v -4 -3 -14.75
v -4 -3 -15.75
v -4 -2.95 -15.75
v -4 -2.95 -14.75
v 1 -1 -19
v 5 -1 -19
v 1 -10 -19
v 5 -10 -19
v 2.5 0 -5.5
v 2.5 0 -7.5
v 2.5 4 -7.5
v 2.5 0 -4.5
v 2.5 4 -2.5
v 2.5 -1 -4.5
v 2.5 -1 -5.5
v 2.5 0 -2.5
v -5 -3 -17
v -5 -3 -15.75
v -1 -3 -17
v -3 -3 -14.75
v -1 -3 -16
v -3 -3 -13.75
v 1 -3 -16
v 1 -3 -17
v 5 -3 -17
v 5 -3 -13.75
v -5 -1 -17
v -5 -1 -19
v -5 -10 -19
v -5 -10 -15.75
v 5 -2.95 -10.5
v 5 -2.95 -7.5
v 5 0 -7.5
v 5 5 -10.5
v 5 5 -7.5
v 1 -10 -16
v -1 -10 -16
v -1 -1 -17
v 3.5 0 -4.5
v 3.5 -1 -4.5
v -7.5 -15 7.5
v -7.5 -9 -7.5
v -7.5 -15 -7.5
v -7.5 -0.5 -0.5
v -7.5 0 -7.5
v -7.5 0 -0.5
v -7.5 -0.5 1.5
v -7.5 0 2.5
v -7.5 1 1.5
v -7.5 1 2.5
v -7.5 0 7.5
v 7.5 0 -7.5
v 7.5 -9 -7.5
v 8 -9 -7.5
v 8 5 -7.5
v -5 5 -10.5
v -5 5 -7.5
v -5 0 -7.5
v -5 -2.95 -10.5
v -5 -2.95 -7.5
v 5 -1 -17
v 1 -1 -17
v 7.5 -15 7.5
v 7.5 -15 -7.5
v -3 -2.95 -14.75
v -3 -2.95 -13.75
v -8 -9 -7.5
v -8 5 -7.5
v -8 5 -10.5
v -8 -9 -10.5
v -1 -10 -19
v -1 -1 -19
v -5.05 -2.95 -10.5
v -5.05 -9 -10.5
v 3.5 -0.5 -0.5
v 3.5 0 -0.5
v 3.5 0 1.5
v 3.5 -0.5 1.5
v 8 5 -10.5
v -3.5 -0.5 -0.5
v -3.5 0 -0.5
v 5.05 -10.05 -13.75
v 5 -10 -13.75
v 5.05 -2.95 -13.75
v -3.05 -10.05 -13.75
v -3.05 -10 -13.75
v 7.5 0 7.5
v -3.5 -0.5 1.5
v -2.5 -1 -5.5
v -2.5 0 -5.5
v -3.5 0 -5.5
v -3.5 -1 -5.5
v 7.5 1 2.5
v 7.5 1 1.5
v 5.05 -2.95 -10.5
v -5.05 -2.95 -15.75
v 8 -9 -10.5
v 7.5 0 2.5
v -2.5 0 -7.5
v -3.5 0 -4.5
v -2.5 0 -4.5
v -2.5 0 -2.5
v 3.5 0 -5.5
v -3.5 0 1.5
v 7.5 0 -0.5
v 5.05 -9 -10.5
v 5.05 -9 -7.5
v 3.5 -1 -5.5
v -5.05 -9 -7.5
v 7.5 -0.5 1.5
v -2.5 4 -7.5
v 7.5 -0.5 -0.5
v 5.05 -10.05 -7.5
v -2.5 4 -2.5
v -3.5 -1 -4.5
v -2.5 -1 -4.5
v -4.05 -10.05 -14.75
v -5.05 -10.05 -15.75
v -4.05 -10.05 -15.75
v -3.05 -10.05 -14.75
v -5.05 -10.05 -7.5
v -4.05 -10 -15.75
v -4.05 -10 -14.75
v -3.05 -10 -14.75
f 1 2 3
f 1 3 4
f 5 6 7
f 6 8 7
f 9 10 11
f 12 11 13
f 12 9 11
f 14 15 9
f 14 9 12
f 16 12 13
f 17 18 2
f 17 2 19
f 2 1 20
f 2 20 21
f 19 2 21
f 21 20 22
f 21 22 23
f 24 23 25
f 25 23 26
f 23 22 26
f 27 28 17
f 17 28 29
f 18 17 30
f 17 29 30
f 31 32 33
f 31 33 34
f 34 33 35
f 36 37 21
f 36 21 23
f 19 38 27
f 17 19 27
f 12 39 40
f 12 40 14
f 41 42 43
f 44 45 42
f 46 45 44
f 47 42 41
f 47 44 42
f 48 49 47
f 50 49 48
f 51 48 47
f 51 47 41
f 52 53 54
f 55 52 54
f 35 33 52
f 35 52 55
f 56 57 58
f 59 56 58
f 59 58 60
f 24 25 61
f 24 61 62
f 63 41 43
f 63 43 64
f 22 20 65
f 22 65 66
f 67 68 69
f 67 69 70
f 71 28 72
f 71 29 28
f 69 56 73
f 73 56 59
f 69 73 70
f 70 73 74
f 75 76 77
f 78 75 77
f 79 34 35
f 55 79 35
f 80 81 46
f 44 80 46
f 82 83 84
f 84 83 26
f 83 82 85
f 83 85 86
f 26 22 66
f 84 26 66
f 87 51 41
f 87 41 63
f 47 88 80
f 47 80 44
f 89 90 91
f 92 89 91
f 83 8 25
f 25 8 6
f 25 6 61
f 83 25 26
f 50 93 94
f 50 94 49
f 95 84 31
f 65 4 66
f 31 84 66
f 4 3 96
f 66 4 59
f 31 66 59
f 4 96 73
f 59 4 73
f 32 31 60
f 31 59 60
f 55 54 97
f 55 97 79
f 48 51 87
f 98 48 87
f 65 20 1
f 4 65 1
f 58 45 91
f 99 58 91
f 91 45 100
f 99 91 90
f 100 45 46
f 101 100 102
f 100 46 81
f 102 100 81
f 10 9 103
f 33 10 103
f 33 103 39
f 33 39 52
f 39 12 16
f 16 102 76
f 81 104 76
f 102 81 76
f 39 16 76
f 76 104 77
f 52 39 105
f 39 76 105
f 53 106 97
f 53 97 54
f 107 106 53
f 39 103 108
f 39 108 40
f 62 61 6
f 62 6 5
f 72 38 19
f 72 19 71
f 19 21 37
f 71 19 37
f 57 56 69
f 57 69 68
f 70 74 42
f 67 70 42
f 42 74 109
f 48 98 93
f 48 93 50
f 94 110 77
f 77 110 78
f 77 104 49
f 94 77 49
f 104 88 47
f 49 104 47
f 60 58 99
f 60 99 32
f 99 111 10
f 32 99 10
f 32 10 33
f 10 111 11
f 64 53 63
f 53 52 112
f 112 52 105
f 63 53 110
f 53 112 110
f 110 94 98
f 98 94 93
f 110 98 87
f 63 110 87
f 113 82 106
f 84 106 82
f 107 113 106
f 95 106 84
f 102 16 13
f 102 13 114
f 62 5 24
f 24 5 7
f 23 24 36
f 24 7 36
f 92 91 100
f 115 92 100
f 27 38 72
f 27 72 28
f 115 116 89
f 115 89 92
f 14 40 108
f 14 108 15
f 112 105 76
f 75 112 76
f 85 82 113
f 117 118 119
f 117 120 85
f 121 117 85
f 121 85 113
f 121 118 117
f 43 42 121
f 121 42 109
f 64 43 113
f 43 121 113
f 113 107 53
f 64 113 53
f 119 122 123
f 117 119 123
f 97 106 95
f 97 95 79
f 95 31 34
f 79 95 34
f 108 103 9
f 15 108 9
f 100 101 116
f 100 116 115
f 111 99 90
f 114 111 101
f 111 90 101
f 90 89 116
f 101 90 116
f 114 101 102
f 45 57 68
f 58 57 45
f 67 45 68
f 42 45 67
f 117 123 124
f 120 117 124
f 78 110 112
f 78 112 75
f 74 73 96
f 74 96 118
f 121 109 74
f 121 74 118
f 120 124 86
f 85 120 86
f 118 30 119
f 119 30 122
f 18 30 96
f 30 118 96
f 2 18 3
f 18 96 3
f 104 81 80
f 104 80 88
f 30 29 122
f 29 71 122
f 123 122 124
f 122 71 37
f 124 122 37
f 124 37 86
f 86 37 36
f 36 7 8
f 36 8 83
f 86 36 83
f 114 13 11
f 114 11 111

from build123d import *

# Parameters (mm, degrees)
F0_W      = 15
F0_H      = 15
F1_DEPTH  = 15
F2_W      = 10
F2_H      = 7
F3_DEPTH  = 8.5
F4_W      = 4
F4_H      = 7
F5_DEPTH  = 3
F6_W      = 4
F6_H      = 7
F7_DEPTH  = 3
F8_W      = 4
F8_H      = 2
F9_DEPTH  = 2
F10_W     = 4
F10_H     = 2
F11_DEPTH = 2
F12_W     = 14
F12_H     = 3
F13_DEPTH = 3
F14_W     = 14
F14_H     = 3
F15_DEPTH = 3
F16_W     = 5
F16_H     = 5
F17_DEPTH = 4
F18_W     = 15
F18_H     = 1
F19_DEPTH = 1
F20_W     = 1
F20_H     = 1
F21_DEPTH = 1
F22_W     = 1
F22_H     = 1
F23_DEPTH = 1
F24_W     = 2
F24_H     = 2
F25_DEPTH = 0.5
F26_W     = 2
F26_H     = 2
F27_DEPTH = 0.5
F28_W     = 2
F28_H     = 2
F29_DEPTH = 0.5
F30_W     = 10
F30_H     = 6.25
F31_DEPTH = 0.05
F32_W     = 2
F32_H     = 1
F33_DEPTH = 0.05
F34_W     = 1
F34_H     = 1
F35_DEPTH = 0.05
F36_W     = 7.05
F36_H     = 8.25
F37_DEPTH = 0.05
F38_W     = 1
F38_H     = 1
F39_DEPTH = 0.05
F40_W     = 7.1
F40_H     = 6.25
F41_DEPTH = 0.05


with BuildPart() as f1:
    # F0 (on Front) → F1 (new body)
    with BuildSketch(Plane.XZ):
        Rectangle(F0_W, F0_H)
    extrude(amount=F1_DEPTH)

    # F2 (on face) → F3 (join)
    with BuildSketch(Plane(origin=(0, 0, -7.5), x_dir=(1, 0, 0), z_dir=(0, 0, -1))):
        with Locations((0, 6.5)):
            Rectangle(F2_W, F2_H)
    extrude(amount=F3_DEPTH)

    # F4 (on face) → F5 (join)
    with BuildSketch(Plane(origin=(0, 0, -16), x_dir=(1, 0, 0), z_dir=(0, 0, -1))):
        with Locations((-3, 6.5)):
            Rectangle(F4_W, F4_H)
    extrude(amount=F5_DEPTH)

    # F6 (on face) → F7 (join)
    with BuildSketch(Plane(origin=(0, 0, -16), x_dir=(1, 0, 0), z_dir=(0, 0, -1))):
        with Locations((3, 6.5)):
            Rectangle(F6_W, F6_H)
    extrude(amount=F7_DEPTH)

    # F8 (on face) → F9 (join)
    with BuildSketch(Plane(origin=(0, -3, 0), x_dir=(-1, 0, 0), z_dir=(0, 1, 0))):
        with Locations((-3, -18)):
            Rectangle(F8_W, F8_H)
    extrude(amount=F9_DEPTH)

    # F10 (on face) → F11 (join, symmetric)
    with BuildSketch(Plane(origin=(0, -3, 0), x_dir=(-1, 0, 0), z_dir=(0, 1, 0))):
        with Locations((3, -18)):
            Rectangle(F10_W, F10_H)
    extrude(amount=F11_DEPTH, both=True)

    # F12 (on face) → F13 (join)
    with BuildSketch(Plane.YZ.offset(5)):
        with Locations((-2, -9)):
            Rectangle(F12_W, F12_H)
    extrude(amount=F13_DEPTH)

    # F14 (on face) → F15 (join)
    with BuildSketch(Plane(origin=(-5, 0, 0), x_dir=(0, -1, 0), z_dir=(-1, 0, 0))):
        with Locations((2, -9)):
            Rectangle(F14_W, F14_H)
    extrude(amount=F15_DEPTH)

    # F16 (on face) → F17 (join)
    with BuildSketch(Plane(origin=(0, 0, 0), x_dir=(-1, 0, 0), z_dir=(0, 1, 0))):
        with Locations((0, -5)):
            Rectangle(F16_W, F16_H)
    extrude(amount=F17_DEPTH)

    # F18 (on face) → F19 (join)
    with BuildSketch(Plane(origin=(0, 0, 0), x_dir=(-1, 0, 0), z_dir=(0, 1, 0))):
        with Locations((0, 2)):
            Rectangle(F18_W, F18_H)
    extrude(amount=F19_DEPTH)

    # F20 (on face) → F21 (cut)
    with BuildSketch(Plane(origin=(0, 0, 0), x_dir=(-1, 0, 0), z_dir=(0, 1, 0))):
        with Locations((3, -5)):
            Rectangle(F20_W, F20_H)
    extrude(amount=-F21_DEPTH, mode=Mode.SUBTRACT)

    # F22 (on face) → F23 (cut)
    with BuildSketch(Plane(origin=(0, 0, 0), x_dir=(-1, 0, 0), z_dir=(0, 1, 0))):
        with Locations((-3, -5)):
            Rectangle(F22_W, F22_H)
    extrude(amount=-F23_DEPTH, mode=Mode.SUBTRACT)

    # F24 (on face) → F25 (cut)
    with BuildSketch(Plane(origin=(0, 0, 0), x_dir=(-1, 0, 0), z_dir=(0, 1, 0))):
        with Locations((-6.5, 0.5)):
            Rectangle(F24_W, F24_H)
    extrude(amount=-F25_DEPTH, mode=Mode.SUBTRACT)

    # F26 (on face) → F27 (cut)
    with BuildSketch(Plane(origin=(0, 0, 0), x_dir=(-1, 0, 0), z_dir=(0, 1, 0))):
        with Locations((-4.5, 0.5)):
            Rectangle(F26_W, F26_H)
    extrude(amount=-F27_DEPTH, mode=Mode.SUBTRACT)

    # F28 (on face) → F29 (cut)
    with BuildSketch(Plane(origin=(0, 0, 0), x_dir=(-1, 0, 0), z_dir=(0, 1, 0))):
        with Locations((6.5, 0.5)):
            Rectangle(F28_W, F28_H)
        with Locations((4.5, 0.5)):
            Rectangle(F28_W, F28_H)
    extrude(amount=-F29_DEPTH, mode=Mode.SUBTRACT)

    # F30 (on face) → F31 (join)
    with BuildSketch(Plane(origin=(0, -3, 0), x_dir=(-1, 0, 0), z_dir=(0, 1, 0))):
        with Locations((0, -10.625)):
            Rectangle(F30_W, F30_H)
    extrude(amount=F31_DEPTH)

    # F32 (on face) → F33 (join)
    with BuildSketch(Plane(origin=(0, -3, 0), x_dir=(-1, 0, 0), z_dir=(0, 1, 0))):
        with Locations((4, -14.25)):
            Rectangle(F32_W, F32_H)
    extrude(amount=F33_DEPTH)

    # F34 (on face) → F35 (join)
    with BuildSketch(Plane(origin=(0, -3, 0), x_dir=(-1, 0, 0), z_dir=(0, 1, 0))):
        with Locations((4.5, -15.25)):
            Rectangle(F34_W, F34_H)
    extrude(amount=F35_DEPTH)

    # F36 (on face) → F37 (join)
    with BuildSketch(Plane(origin=(-5, 0, 0), x_dir=(0, -1, 0), z_dir=(-1, 0, 0))):
        with Locations((6.475, -11.625)):
            Rectangle(F36_W, F36_H)
    extrude(amount=F37_DEPTH)

    # F38 (on face) → F39 (join)
    with BuildSketch(Plane.XZ.offset(10)):
        Polygon((5, -13.75), (5, -7.5), (-5.05, -7.5), (-5.05, -13.75), (-3.05, -13.75), align=None)
        Polygon((-3.05, -13.75), (-5.05, -13.75), (-5.05, -14.75), (-4.05, -14.75), (-3.05, -14.75), align=None)
        with Locations((-4.55, -15.25)):
            Rectangle(F38_W, F38_H)
    extrude(amount=F39_DEPTH)

    # F40 (on face) → F41 (join)
    with BuildSketch(Plane.YZ.offset(5)):
        with Locations((-6.5, -10.625)):
            Rectangle(F40_W, F40_H)
    extrude(amount=F41_DEPTH)


solid = f1.part
